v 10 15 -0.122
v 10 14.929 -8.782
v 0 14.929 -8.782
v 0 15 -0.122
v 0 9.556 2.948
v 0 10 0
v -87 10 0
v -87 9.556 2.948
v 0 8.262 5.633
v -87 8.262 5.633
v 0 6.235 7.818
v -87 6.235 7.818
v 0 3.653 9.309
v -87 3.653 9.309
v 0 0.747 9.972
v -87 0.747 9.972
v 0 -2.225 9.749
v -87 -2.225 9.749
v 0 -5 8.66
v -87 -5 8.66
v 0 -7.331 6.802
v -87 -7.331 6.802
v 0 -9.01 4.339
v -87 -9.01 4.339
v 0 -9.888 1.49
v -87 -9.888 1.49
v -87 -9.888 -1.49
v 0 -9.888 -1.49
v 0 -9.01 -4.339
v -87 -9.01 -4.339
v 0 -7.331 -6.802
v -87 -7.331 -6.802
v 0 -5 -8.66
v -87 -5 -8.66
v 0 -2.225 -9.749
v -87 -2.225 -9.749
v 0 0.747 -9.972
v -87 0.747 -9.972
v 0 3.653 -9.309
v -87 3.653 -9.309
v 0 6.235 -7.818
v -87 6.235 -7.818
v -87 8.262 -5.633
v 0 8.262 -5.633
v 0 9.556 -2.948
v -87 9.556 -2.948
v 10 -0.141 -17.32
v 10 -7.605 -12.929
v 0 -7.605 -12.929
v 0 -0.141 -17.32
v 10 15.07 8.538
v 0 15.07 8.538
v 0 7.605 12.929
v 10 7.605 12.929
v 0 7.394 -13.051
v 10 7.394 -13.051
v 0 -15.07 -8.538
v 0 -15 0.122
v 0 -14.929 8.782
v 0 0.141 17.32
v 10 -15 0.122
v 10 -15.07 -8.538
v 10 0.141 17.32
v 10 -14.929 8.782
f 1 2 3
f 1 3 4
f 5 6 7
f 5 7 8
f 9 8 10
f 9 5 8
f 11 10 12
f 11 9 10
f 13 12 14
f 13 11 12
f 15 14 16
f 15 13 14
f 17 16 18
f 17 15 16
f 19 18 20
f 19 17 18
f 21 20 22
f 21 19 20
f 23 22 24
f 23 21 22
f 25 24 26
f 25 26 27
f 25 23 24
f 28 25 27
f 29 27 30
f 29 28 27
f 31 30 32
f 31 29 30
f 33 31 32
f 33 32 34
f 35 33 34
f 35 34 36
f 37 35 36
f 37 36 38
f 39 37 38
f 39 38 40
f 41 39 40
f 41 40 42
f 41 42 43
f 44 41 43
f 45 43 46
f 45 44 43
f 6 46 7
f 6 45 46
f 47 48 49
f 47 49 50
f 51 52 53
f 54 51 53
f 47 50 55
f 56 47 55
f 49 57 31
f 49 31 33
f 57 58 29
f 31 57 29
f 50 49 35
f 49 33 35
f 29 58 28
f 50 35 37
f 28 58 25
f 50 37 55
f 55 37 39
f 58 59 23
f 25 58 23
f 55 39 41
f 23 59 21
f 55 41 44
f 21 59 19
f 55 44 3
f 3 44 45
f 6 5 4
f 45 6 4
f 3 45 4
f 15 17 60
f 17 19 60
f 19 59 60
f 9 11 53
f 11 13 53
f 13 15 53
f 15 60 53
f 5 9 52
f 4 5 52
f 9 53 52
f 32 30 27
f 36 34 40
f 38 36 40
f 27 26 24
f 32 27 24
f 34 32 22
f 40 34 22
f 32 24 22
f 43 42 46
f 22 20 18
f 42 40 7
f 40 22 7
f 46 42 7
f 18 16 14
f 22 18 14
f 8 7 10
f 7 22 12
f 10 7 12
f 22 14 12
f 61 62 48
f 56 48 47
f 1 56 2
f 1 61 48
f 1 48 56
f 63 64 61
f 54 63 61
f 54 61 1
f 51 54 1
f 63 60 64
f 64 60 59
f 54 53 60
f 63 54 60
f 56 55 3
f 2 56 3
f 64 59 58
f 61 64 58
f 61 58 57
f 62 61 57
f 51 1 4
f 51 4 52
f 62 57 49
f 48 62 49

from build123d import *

# Parameters (mm, degrees)
F0_R      = 10
F1_DEPTH  = 87
F1_FACE_R = 10
F2_DEPTH  = 10


with BuildPart() as f1:
    # F0 (on Right) → F1 (new body)
    with BuildSketch(Plane.YZ):
        Circle(F0_R)
    extrude(amount=-F1_DEPTH)

    # F0 (on Right) + F1_face (on face) → F2 (join)
    with BuildSketch(Plane.YZ):
        with BuildLine():
            ThreePointArc((14.9995050606, -0.1218521055), (14.9998762647, -0.0609265554), (15, 0))
            ThreePointArc((15, 0), (13.0207371521, 7.4471742302), (7.6052794647, 12.9290264237))
            ThreePointArc((7.6052794647, 12.9290264237), (0.1218517845, 14.9995050633), (-7.3942259846, 13.0508782114))
            ThreePointArc((-7.3942259846, 13.0508782114), (-12.929026562, 7.6052792295), (-14.9995050623, 0.1218519076))
            ThreePointArc((-14.9995050623, 0.1218519076), (-13.0508782952, -7.3942258367), (-7.6052790755, -12.9290266526))
            ThreePointArc((-7.6052790755, -12.9290266526), (-0.1218515337, -14.9995050653), (7.3942260283, -13.0508781867))
            ThreePointArc((7.3942260283, -13.0508781867), (12.9290265245, -7.6052792932), (14.9995050606, -0.1218521055))
        make_face()
        Circle(F0_R, mode=Mode.SUBTRACT)
        with BuildLine():
            ThreePointArc((7.6052794647, 12.9290264237), (13.0207371521, 7.4471742302), (15, 0))
            ThreePointArc((15, 0), (14.9998762647, -0.0609265554), (14.9995050606, -0.1218521055))
            Line((14.9995050606, -0.1218521055), (15.0698562292, 8.5381164921))
            Line((15.0698562292, 8.5381164921), (7.6052794647, 12.9290264237))
        make_face()
        with BuildLine():
            ThreePointArc((-7.3942259846, 13.0508782114), (0.1218517845, 14.9995050633), (7.6052794647, 12.9290264237))
            Line((7.6052794647, 12.9290264237), (0.140702332, 17.3199365719))
            Line((0.140702332, 17.3199365719), (-7.3942259846, 13.0508782114))
        make_face()
        with BuildLine():
            Line((14.9291538972, -8.7818200798), (14.9995050606, -0.1218521055))
            ThreePointArc((14.9995050606, -0.1218521055), (12.9290265245, -7.6052792932), (7.3942260283, -13.0508781867))
            Line((7.3942260283, -13.0508781867), (14.9291538972, -8.7818200798))
        make_face()
        with BuildLine():
            ThreePointArc((-14.9995050623, 0.1218519076), (-12.929026562, 7.6052792295), (-7.3942259846, 13.0508782114))
            Line((-7.3942259846, 13.0508782114), (-14.9291538972, 8.7818200798))
            Line((-14.9291538972, 8.7818200798), (-14.9995050623, 0.1218519076))
        make_face()
        with BuildLine():
            Line((-0.140702332, -17.3199365719), (7.3942260283, -13.0508781867))
            ThreePointArc((7.3942260283, -13.0508781867), (-0.1218515337, -14.9995050653), (-7.6052790755, -12.9290266526))
            Line((-7.6052790755, -12.9290266526), (-0.140702332, -17.3199365719))
        make_face()
        with BuildLine():
            ThreePointArc((-7.6052790755, -12.9290266526), (-13.0508782952, -7.3942258367), (-14.9995050623, 0.1218519076))
            Line((-14.9995050623, 0.1218519076), (-15.0698562292, -8.5381164921))
            Line((-15.0698562292, -8.5381164921), (-7.6052790755, -12.9290266526))
        make_face()
    with BuildSketch(Plane.YZ):
        Circle(F1_FACE_R)
    extrude(amount=F2_DEPTH)


solid = f1.part
